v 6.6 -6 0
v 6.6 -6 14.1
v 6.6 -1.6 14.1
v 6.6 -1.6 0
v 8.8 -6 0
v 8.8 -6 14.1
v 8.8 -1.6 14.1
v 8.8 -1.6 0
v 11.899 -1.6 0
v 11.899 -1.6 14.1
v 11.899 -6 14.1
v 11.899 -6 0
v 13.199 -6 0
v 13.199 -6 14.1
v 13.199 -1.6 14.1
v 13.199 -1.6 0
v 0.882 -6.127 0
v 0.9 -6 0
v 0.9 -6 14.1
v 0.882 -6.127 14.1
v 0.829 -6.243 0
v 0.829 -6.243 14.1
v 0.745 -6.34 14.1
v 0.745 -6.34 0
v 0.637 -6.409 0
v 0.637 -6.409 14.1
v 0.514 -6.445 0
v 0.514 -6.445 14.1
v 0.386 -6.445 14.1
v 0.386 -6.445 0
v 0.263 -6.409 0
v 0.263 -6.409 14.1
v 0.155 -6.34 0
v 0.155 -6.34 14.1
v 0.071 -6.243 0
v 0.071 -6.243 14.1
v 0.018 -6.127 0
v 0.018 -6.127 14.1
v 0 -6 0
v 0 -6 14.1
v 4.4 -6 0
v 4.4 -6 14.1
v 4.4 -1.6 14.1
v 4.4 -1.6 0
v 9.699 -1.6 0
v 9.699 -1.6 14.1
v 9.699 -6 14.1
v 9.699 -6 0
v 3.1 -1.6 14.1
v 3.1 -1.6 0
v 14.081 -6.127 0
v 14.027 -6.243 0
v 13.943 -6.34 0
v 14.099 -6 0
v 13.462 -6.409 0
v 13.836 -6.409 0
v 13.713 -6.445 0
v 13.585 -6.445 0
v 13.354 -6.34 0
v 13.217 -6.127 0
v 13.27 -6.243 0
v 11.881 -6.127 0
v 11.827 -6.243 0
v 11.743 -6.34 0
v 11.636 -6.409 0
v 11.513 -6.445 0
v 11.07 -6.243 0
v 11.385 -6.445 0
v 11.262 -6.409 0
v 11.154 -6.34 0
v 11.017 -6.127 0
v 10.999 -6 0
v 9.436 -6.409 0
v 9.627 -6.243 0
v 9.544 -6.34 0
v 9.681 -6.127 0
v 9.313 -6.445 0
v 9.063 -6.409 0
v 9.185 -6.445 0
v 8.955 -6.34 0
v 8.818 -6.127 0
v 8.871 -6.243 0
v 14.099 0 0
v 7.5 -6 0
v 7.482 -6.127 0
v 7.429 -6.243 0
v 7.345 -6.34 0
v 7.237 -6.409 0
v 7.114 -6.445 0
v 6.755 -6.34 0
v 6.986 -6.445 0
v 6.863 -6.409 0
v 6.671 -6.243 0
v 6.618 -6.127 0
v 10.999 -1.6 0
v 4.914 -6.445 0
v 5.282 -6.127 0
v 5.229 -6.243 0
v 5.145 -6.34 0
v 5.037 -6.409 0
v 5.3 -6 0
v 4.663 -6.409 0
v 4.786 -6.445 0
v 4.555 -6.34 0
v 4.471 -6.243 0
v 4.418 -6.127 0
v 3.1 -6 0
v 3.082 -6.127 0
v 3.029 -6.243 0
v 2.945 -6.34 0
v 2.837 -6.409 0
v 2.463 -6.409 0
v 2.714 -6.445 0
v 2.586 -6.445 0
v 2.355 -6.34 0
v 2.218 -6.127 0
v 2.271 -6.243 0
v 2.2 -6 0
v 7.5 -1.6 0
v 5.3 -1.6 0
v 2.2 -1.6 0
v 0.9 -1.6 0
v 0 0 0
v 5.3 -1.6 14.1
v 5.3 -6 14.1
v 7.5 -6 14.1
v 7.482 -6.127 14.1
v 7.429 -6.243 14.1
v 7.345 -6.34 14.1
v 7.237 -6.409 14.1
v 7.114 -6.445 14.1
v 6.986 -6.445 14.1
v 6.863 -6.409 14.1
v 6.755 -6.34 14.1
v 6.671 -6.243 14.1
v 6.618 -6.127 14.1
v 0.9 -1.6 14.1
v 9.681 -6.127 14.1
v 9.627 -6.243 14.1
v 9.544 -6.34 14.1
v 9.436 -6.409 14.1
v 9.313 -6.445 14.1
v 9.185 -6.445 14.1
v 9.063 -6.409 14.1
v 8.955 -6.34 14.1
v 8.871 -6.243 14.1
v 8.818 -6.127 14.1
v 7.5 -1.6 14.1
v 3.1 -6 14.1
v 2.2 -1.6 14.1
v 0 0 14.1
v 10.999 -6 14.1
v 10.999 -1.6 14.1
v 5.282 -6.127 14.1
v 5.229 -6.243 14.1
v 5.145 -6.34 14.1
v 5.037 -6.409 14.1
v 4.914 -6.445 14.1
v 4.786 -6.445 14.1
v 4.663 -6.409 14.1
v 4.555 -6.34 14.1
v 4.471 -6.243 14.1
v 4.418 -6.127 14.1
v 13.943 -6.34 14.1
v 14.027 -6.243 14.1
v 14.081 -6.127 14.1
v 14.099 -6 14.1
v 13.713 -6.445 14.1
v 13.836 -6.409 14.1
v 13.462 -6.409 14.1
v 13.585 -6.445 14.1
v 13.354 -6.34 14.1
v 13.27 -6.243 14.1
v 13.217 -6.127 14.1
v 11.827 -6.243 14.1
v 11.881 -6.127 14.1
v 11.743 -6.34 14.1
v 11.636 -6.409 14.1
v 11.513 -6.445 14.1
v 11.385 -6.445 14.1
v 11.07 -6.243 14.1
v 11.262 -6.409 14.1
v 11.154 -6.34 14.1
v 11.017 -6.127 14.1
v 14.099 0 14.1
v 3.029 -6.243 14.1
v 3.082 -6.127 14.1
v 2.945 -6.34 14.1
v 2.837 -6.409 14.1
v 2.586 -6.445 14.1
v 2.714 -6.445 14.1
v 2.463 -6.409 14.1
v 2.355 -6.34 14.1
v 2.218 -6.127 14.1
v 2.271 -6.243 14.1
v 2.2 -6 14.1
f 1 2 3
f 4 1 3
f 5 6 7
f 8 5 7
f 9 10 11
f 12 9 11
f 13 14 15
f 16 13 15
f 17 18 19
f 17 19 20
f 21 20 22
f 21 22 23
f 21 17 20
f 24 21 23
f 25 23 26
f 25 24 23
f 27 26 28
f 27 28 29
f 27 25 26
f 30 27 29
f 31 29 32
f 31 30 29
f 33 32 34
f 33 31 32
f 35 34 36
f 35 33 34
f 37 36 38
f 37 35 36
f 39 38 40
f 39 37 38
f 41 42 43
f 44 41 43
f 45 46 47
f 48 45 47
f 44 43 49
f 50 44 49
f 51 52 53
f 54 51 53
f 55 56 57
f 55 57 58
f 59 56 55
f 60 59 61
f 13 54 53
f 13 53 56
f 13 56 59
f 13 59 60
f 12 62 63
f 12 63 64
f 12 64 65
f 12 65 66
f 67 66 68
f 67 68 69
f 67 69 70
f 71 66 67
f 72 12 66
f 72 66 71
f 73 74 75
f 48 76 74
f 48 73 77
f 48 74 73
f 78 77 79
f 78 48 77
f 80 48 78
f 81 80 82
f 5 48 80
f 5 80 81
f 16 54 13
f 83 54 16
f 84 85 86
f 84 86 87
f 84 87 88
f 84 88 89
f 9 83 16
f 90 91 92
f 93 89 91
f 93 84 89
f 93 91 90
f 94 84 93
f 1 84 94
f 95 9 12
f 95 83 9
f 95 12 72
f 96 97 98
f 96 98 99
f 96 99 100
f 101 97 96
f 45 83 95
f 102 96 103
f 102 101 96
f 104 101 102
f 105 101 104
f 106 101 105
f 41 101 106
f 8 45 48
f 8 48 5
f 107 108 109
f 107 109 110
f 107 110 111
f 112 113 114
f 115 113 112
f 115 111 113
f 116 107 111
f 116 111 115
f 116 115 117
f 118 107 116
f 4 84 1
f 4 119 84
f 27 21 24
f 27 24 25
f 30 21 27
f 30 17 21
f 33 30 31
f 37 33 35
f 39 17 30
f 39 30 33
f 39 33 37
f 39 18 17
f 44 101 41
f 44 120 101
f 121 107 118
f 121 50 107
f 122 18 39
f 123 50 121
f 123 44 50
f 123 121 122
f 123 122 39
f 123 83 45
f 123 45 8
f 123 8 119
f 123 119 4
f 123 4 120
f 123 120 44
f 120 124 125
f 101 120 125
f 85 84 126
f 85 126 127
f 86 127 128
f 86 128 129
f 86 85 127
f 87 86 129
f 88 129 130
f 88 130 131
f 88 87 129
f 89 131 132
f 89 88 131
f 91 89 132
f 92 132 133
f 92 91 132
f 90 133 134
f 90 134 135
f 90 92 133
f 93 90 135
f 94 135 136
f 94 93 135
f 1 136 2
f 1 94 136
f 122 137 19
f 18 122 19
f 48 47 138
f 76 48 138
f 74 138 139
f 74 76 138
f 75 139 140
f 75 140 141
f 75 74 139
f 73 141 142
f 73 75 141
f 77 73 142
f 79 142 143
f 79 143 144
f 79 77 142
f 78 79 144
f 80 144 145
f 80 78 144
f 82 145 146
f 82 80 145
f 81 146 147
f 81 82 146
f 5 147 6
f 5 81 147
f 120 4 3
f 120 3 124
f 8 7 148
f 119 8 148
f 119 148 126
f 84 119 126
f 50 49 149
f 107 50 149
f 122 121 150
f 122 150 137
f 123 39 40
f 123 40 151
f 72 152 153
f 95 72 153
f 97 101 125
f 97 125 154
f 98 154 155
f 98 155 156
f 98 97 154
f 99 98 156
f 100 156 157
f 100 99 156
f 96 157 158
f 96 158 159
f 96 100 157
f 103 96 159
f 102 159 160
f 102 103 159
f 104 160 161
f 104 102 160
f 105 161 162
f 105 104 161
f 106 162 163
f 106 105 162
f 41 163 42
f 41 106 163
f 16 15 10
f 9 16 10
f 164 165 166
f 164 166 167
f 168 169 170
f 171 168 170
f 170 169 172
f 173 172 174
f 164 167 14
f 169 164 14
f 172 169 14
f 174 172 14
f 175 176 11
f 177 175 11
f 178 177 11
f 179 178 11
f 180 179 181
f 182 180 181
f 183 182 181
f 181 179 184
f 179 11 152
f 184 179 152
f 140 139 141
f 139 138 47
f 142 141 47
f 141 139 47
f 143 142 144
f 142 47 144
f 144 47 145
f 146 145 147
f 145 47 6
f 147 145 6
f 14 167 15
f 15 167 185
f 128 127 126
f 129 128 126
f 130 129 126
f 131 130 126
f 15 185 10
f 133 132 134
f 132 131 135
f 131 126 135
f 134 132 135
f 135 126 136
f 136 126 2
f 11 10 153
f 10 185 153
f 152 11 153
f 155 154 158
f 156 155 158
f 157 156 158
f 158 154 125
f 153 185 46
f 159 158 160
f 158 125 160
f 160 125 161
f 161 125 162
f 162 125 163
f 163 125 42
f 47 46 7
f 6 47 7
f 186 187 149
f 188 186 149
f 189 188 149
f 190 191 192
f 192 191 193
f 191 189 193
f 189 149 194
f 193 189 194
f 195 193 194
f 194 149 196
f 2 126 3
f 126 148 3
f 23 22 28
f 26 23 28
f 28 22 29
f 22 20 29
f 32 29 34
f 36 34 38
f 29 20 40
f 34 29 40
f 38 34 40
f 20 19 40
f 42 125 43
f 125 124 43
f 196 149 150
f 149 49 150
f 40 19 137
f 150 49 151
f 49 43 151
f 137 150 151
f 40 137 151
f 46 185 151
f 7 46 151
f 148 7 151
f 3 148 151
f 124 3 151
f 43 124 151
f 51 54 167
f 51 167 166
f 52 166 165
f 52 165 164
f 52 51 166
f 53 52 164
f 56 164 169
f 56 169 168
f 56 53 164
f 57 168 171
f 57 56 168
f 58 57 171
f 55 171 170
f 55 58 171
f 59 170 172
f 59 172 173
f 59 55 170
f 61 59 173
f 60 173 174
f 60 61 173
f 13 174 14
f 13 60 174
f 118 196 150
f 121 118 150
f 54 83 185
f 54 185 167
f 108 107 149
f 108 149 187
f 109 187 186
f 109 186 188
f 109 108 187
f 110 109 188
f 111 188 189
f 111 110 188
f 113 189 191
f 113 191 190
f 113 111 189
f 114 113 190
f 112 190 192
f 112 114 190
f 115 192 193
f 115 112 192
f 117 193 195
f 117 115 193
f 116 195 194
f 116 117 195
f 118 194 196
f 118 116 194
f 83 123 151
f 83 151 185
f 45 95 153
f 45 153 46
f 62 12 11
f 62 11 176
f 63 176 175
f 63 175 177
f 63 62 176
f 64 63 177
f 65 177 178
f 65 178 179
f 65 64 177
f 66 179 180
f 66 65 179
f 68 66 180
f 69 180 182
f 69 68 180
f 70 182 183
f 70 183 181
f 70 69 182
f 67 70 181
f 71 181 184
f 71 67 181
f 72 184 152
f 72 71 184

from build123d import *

# Parameters (mm, degrees)
BOSS_EXTRUDE1_DEPTH = 14.1


with BuildPart() as part:
    # Esboço1 → Boss-Extrude1 (new body)
    with BuildSketch(Plane.XY):
        with BuildLine():
            Line((0, 0), (14.098810584, 0))
            Line((14.098810584, 0), (14.098810584, -6))
            ThreePointArc((14.098810584, -6), (13.648810584, -6.45), (13.198810584, -6))
            Line((13.198810584, -6), (13.198810584, -1.6))
            Line((13.198810584, -1.6), (11.898810584, -1.6))
            Line((11.898810584, -1.6), (11.898810584, -6))
            ThreePointArc((11.898810584, -6), (11.448810584, -6.45), (10.998810584, -6))
            Line((10.998810584, -6), (10.998810584, -1.6))
            Line((10.998810584, -1.6), (9.698810584, -1.6))
            Line((9.698810584, -1.6), (9.698810584, -6))
            ThreePointArc((9.698810584, -6), (9.249405292, -6.449405292), (8.8, -6))
            Line((8.8, -6), (8.8, -1.6))
            Line((8.8, -1.6), (7.5, -1.6))
            Line((7.5, -1.6), (7.5, -6))
            ThreePointArc((7.5, -6), (7.05, -6.45), (6.6, -6))
            Line((6.6, -6), (6.6, -1.6))
            Line((6.6, -1.6), (5.3, -1.6))
            Line((5.3, -1.6), (5.3, -6))
            ThreePointArc((5.3, -6), (4.85, -6.45), (4.4, -6))
            Line((4.4, -6), (4.4, -1.6))
            Line((4.4, -1.6), (3.1, -1.6))
            Line((3.1, -1.6), (3.1, -6))
            ThreePointArc((3.1, -6), (2.65, -6.45), (2.2, -6))
            Line((2.2, -6), (2.2, -1.6))
            Line((2.2, -1.6), (0.9, -1.6))
            Line((0.9, -1.6), (0.9, -6))
            ThreePointArc((0.9, -6), (0.45, -6.45), (0, -6))
            Line((0, -6), (0, 0))
        make_face()
    extrude(amount=BOSS_EXTRUDE1_DEPTH)


solid = part.part
